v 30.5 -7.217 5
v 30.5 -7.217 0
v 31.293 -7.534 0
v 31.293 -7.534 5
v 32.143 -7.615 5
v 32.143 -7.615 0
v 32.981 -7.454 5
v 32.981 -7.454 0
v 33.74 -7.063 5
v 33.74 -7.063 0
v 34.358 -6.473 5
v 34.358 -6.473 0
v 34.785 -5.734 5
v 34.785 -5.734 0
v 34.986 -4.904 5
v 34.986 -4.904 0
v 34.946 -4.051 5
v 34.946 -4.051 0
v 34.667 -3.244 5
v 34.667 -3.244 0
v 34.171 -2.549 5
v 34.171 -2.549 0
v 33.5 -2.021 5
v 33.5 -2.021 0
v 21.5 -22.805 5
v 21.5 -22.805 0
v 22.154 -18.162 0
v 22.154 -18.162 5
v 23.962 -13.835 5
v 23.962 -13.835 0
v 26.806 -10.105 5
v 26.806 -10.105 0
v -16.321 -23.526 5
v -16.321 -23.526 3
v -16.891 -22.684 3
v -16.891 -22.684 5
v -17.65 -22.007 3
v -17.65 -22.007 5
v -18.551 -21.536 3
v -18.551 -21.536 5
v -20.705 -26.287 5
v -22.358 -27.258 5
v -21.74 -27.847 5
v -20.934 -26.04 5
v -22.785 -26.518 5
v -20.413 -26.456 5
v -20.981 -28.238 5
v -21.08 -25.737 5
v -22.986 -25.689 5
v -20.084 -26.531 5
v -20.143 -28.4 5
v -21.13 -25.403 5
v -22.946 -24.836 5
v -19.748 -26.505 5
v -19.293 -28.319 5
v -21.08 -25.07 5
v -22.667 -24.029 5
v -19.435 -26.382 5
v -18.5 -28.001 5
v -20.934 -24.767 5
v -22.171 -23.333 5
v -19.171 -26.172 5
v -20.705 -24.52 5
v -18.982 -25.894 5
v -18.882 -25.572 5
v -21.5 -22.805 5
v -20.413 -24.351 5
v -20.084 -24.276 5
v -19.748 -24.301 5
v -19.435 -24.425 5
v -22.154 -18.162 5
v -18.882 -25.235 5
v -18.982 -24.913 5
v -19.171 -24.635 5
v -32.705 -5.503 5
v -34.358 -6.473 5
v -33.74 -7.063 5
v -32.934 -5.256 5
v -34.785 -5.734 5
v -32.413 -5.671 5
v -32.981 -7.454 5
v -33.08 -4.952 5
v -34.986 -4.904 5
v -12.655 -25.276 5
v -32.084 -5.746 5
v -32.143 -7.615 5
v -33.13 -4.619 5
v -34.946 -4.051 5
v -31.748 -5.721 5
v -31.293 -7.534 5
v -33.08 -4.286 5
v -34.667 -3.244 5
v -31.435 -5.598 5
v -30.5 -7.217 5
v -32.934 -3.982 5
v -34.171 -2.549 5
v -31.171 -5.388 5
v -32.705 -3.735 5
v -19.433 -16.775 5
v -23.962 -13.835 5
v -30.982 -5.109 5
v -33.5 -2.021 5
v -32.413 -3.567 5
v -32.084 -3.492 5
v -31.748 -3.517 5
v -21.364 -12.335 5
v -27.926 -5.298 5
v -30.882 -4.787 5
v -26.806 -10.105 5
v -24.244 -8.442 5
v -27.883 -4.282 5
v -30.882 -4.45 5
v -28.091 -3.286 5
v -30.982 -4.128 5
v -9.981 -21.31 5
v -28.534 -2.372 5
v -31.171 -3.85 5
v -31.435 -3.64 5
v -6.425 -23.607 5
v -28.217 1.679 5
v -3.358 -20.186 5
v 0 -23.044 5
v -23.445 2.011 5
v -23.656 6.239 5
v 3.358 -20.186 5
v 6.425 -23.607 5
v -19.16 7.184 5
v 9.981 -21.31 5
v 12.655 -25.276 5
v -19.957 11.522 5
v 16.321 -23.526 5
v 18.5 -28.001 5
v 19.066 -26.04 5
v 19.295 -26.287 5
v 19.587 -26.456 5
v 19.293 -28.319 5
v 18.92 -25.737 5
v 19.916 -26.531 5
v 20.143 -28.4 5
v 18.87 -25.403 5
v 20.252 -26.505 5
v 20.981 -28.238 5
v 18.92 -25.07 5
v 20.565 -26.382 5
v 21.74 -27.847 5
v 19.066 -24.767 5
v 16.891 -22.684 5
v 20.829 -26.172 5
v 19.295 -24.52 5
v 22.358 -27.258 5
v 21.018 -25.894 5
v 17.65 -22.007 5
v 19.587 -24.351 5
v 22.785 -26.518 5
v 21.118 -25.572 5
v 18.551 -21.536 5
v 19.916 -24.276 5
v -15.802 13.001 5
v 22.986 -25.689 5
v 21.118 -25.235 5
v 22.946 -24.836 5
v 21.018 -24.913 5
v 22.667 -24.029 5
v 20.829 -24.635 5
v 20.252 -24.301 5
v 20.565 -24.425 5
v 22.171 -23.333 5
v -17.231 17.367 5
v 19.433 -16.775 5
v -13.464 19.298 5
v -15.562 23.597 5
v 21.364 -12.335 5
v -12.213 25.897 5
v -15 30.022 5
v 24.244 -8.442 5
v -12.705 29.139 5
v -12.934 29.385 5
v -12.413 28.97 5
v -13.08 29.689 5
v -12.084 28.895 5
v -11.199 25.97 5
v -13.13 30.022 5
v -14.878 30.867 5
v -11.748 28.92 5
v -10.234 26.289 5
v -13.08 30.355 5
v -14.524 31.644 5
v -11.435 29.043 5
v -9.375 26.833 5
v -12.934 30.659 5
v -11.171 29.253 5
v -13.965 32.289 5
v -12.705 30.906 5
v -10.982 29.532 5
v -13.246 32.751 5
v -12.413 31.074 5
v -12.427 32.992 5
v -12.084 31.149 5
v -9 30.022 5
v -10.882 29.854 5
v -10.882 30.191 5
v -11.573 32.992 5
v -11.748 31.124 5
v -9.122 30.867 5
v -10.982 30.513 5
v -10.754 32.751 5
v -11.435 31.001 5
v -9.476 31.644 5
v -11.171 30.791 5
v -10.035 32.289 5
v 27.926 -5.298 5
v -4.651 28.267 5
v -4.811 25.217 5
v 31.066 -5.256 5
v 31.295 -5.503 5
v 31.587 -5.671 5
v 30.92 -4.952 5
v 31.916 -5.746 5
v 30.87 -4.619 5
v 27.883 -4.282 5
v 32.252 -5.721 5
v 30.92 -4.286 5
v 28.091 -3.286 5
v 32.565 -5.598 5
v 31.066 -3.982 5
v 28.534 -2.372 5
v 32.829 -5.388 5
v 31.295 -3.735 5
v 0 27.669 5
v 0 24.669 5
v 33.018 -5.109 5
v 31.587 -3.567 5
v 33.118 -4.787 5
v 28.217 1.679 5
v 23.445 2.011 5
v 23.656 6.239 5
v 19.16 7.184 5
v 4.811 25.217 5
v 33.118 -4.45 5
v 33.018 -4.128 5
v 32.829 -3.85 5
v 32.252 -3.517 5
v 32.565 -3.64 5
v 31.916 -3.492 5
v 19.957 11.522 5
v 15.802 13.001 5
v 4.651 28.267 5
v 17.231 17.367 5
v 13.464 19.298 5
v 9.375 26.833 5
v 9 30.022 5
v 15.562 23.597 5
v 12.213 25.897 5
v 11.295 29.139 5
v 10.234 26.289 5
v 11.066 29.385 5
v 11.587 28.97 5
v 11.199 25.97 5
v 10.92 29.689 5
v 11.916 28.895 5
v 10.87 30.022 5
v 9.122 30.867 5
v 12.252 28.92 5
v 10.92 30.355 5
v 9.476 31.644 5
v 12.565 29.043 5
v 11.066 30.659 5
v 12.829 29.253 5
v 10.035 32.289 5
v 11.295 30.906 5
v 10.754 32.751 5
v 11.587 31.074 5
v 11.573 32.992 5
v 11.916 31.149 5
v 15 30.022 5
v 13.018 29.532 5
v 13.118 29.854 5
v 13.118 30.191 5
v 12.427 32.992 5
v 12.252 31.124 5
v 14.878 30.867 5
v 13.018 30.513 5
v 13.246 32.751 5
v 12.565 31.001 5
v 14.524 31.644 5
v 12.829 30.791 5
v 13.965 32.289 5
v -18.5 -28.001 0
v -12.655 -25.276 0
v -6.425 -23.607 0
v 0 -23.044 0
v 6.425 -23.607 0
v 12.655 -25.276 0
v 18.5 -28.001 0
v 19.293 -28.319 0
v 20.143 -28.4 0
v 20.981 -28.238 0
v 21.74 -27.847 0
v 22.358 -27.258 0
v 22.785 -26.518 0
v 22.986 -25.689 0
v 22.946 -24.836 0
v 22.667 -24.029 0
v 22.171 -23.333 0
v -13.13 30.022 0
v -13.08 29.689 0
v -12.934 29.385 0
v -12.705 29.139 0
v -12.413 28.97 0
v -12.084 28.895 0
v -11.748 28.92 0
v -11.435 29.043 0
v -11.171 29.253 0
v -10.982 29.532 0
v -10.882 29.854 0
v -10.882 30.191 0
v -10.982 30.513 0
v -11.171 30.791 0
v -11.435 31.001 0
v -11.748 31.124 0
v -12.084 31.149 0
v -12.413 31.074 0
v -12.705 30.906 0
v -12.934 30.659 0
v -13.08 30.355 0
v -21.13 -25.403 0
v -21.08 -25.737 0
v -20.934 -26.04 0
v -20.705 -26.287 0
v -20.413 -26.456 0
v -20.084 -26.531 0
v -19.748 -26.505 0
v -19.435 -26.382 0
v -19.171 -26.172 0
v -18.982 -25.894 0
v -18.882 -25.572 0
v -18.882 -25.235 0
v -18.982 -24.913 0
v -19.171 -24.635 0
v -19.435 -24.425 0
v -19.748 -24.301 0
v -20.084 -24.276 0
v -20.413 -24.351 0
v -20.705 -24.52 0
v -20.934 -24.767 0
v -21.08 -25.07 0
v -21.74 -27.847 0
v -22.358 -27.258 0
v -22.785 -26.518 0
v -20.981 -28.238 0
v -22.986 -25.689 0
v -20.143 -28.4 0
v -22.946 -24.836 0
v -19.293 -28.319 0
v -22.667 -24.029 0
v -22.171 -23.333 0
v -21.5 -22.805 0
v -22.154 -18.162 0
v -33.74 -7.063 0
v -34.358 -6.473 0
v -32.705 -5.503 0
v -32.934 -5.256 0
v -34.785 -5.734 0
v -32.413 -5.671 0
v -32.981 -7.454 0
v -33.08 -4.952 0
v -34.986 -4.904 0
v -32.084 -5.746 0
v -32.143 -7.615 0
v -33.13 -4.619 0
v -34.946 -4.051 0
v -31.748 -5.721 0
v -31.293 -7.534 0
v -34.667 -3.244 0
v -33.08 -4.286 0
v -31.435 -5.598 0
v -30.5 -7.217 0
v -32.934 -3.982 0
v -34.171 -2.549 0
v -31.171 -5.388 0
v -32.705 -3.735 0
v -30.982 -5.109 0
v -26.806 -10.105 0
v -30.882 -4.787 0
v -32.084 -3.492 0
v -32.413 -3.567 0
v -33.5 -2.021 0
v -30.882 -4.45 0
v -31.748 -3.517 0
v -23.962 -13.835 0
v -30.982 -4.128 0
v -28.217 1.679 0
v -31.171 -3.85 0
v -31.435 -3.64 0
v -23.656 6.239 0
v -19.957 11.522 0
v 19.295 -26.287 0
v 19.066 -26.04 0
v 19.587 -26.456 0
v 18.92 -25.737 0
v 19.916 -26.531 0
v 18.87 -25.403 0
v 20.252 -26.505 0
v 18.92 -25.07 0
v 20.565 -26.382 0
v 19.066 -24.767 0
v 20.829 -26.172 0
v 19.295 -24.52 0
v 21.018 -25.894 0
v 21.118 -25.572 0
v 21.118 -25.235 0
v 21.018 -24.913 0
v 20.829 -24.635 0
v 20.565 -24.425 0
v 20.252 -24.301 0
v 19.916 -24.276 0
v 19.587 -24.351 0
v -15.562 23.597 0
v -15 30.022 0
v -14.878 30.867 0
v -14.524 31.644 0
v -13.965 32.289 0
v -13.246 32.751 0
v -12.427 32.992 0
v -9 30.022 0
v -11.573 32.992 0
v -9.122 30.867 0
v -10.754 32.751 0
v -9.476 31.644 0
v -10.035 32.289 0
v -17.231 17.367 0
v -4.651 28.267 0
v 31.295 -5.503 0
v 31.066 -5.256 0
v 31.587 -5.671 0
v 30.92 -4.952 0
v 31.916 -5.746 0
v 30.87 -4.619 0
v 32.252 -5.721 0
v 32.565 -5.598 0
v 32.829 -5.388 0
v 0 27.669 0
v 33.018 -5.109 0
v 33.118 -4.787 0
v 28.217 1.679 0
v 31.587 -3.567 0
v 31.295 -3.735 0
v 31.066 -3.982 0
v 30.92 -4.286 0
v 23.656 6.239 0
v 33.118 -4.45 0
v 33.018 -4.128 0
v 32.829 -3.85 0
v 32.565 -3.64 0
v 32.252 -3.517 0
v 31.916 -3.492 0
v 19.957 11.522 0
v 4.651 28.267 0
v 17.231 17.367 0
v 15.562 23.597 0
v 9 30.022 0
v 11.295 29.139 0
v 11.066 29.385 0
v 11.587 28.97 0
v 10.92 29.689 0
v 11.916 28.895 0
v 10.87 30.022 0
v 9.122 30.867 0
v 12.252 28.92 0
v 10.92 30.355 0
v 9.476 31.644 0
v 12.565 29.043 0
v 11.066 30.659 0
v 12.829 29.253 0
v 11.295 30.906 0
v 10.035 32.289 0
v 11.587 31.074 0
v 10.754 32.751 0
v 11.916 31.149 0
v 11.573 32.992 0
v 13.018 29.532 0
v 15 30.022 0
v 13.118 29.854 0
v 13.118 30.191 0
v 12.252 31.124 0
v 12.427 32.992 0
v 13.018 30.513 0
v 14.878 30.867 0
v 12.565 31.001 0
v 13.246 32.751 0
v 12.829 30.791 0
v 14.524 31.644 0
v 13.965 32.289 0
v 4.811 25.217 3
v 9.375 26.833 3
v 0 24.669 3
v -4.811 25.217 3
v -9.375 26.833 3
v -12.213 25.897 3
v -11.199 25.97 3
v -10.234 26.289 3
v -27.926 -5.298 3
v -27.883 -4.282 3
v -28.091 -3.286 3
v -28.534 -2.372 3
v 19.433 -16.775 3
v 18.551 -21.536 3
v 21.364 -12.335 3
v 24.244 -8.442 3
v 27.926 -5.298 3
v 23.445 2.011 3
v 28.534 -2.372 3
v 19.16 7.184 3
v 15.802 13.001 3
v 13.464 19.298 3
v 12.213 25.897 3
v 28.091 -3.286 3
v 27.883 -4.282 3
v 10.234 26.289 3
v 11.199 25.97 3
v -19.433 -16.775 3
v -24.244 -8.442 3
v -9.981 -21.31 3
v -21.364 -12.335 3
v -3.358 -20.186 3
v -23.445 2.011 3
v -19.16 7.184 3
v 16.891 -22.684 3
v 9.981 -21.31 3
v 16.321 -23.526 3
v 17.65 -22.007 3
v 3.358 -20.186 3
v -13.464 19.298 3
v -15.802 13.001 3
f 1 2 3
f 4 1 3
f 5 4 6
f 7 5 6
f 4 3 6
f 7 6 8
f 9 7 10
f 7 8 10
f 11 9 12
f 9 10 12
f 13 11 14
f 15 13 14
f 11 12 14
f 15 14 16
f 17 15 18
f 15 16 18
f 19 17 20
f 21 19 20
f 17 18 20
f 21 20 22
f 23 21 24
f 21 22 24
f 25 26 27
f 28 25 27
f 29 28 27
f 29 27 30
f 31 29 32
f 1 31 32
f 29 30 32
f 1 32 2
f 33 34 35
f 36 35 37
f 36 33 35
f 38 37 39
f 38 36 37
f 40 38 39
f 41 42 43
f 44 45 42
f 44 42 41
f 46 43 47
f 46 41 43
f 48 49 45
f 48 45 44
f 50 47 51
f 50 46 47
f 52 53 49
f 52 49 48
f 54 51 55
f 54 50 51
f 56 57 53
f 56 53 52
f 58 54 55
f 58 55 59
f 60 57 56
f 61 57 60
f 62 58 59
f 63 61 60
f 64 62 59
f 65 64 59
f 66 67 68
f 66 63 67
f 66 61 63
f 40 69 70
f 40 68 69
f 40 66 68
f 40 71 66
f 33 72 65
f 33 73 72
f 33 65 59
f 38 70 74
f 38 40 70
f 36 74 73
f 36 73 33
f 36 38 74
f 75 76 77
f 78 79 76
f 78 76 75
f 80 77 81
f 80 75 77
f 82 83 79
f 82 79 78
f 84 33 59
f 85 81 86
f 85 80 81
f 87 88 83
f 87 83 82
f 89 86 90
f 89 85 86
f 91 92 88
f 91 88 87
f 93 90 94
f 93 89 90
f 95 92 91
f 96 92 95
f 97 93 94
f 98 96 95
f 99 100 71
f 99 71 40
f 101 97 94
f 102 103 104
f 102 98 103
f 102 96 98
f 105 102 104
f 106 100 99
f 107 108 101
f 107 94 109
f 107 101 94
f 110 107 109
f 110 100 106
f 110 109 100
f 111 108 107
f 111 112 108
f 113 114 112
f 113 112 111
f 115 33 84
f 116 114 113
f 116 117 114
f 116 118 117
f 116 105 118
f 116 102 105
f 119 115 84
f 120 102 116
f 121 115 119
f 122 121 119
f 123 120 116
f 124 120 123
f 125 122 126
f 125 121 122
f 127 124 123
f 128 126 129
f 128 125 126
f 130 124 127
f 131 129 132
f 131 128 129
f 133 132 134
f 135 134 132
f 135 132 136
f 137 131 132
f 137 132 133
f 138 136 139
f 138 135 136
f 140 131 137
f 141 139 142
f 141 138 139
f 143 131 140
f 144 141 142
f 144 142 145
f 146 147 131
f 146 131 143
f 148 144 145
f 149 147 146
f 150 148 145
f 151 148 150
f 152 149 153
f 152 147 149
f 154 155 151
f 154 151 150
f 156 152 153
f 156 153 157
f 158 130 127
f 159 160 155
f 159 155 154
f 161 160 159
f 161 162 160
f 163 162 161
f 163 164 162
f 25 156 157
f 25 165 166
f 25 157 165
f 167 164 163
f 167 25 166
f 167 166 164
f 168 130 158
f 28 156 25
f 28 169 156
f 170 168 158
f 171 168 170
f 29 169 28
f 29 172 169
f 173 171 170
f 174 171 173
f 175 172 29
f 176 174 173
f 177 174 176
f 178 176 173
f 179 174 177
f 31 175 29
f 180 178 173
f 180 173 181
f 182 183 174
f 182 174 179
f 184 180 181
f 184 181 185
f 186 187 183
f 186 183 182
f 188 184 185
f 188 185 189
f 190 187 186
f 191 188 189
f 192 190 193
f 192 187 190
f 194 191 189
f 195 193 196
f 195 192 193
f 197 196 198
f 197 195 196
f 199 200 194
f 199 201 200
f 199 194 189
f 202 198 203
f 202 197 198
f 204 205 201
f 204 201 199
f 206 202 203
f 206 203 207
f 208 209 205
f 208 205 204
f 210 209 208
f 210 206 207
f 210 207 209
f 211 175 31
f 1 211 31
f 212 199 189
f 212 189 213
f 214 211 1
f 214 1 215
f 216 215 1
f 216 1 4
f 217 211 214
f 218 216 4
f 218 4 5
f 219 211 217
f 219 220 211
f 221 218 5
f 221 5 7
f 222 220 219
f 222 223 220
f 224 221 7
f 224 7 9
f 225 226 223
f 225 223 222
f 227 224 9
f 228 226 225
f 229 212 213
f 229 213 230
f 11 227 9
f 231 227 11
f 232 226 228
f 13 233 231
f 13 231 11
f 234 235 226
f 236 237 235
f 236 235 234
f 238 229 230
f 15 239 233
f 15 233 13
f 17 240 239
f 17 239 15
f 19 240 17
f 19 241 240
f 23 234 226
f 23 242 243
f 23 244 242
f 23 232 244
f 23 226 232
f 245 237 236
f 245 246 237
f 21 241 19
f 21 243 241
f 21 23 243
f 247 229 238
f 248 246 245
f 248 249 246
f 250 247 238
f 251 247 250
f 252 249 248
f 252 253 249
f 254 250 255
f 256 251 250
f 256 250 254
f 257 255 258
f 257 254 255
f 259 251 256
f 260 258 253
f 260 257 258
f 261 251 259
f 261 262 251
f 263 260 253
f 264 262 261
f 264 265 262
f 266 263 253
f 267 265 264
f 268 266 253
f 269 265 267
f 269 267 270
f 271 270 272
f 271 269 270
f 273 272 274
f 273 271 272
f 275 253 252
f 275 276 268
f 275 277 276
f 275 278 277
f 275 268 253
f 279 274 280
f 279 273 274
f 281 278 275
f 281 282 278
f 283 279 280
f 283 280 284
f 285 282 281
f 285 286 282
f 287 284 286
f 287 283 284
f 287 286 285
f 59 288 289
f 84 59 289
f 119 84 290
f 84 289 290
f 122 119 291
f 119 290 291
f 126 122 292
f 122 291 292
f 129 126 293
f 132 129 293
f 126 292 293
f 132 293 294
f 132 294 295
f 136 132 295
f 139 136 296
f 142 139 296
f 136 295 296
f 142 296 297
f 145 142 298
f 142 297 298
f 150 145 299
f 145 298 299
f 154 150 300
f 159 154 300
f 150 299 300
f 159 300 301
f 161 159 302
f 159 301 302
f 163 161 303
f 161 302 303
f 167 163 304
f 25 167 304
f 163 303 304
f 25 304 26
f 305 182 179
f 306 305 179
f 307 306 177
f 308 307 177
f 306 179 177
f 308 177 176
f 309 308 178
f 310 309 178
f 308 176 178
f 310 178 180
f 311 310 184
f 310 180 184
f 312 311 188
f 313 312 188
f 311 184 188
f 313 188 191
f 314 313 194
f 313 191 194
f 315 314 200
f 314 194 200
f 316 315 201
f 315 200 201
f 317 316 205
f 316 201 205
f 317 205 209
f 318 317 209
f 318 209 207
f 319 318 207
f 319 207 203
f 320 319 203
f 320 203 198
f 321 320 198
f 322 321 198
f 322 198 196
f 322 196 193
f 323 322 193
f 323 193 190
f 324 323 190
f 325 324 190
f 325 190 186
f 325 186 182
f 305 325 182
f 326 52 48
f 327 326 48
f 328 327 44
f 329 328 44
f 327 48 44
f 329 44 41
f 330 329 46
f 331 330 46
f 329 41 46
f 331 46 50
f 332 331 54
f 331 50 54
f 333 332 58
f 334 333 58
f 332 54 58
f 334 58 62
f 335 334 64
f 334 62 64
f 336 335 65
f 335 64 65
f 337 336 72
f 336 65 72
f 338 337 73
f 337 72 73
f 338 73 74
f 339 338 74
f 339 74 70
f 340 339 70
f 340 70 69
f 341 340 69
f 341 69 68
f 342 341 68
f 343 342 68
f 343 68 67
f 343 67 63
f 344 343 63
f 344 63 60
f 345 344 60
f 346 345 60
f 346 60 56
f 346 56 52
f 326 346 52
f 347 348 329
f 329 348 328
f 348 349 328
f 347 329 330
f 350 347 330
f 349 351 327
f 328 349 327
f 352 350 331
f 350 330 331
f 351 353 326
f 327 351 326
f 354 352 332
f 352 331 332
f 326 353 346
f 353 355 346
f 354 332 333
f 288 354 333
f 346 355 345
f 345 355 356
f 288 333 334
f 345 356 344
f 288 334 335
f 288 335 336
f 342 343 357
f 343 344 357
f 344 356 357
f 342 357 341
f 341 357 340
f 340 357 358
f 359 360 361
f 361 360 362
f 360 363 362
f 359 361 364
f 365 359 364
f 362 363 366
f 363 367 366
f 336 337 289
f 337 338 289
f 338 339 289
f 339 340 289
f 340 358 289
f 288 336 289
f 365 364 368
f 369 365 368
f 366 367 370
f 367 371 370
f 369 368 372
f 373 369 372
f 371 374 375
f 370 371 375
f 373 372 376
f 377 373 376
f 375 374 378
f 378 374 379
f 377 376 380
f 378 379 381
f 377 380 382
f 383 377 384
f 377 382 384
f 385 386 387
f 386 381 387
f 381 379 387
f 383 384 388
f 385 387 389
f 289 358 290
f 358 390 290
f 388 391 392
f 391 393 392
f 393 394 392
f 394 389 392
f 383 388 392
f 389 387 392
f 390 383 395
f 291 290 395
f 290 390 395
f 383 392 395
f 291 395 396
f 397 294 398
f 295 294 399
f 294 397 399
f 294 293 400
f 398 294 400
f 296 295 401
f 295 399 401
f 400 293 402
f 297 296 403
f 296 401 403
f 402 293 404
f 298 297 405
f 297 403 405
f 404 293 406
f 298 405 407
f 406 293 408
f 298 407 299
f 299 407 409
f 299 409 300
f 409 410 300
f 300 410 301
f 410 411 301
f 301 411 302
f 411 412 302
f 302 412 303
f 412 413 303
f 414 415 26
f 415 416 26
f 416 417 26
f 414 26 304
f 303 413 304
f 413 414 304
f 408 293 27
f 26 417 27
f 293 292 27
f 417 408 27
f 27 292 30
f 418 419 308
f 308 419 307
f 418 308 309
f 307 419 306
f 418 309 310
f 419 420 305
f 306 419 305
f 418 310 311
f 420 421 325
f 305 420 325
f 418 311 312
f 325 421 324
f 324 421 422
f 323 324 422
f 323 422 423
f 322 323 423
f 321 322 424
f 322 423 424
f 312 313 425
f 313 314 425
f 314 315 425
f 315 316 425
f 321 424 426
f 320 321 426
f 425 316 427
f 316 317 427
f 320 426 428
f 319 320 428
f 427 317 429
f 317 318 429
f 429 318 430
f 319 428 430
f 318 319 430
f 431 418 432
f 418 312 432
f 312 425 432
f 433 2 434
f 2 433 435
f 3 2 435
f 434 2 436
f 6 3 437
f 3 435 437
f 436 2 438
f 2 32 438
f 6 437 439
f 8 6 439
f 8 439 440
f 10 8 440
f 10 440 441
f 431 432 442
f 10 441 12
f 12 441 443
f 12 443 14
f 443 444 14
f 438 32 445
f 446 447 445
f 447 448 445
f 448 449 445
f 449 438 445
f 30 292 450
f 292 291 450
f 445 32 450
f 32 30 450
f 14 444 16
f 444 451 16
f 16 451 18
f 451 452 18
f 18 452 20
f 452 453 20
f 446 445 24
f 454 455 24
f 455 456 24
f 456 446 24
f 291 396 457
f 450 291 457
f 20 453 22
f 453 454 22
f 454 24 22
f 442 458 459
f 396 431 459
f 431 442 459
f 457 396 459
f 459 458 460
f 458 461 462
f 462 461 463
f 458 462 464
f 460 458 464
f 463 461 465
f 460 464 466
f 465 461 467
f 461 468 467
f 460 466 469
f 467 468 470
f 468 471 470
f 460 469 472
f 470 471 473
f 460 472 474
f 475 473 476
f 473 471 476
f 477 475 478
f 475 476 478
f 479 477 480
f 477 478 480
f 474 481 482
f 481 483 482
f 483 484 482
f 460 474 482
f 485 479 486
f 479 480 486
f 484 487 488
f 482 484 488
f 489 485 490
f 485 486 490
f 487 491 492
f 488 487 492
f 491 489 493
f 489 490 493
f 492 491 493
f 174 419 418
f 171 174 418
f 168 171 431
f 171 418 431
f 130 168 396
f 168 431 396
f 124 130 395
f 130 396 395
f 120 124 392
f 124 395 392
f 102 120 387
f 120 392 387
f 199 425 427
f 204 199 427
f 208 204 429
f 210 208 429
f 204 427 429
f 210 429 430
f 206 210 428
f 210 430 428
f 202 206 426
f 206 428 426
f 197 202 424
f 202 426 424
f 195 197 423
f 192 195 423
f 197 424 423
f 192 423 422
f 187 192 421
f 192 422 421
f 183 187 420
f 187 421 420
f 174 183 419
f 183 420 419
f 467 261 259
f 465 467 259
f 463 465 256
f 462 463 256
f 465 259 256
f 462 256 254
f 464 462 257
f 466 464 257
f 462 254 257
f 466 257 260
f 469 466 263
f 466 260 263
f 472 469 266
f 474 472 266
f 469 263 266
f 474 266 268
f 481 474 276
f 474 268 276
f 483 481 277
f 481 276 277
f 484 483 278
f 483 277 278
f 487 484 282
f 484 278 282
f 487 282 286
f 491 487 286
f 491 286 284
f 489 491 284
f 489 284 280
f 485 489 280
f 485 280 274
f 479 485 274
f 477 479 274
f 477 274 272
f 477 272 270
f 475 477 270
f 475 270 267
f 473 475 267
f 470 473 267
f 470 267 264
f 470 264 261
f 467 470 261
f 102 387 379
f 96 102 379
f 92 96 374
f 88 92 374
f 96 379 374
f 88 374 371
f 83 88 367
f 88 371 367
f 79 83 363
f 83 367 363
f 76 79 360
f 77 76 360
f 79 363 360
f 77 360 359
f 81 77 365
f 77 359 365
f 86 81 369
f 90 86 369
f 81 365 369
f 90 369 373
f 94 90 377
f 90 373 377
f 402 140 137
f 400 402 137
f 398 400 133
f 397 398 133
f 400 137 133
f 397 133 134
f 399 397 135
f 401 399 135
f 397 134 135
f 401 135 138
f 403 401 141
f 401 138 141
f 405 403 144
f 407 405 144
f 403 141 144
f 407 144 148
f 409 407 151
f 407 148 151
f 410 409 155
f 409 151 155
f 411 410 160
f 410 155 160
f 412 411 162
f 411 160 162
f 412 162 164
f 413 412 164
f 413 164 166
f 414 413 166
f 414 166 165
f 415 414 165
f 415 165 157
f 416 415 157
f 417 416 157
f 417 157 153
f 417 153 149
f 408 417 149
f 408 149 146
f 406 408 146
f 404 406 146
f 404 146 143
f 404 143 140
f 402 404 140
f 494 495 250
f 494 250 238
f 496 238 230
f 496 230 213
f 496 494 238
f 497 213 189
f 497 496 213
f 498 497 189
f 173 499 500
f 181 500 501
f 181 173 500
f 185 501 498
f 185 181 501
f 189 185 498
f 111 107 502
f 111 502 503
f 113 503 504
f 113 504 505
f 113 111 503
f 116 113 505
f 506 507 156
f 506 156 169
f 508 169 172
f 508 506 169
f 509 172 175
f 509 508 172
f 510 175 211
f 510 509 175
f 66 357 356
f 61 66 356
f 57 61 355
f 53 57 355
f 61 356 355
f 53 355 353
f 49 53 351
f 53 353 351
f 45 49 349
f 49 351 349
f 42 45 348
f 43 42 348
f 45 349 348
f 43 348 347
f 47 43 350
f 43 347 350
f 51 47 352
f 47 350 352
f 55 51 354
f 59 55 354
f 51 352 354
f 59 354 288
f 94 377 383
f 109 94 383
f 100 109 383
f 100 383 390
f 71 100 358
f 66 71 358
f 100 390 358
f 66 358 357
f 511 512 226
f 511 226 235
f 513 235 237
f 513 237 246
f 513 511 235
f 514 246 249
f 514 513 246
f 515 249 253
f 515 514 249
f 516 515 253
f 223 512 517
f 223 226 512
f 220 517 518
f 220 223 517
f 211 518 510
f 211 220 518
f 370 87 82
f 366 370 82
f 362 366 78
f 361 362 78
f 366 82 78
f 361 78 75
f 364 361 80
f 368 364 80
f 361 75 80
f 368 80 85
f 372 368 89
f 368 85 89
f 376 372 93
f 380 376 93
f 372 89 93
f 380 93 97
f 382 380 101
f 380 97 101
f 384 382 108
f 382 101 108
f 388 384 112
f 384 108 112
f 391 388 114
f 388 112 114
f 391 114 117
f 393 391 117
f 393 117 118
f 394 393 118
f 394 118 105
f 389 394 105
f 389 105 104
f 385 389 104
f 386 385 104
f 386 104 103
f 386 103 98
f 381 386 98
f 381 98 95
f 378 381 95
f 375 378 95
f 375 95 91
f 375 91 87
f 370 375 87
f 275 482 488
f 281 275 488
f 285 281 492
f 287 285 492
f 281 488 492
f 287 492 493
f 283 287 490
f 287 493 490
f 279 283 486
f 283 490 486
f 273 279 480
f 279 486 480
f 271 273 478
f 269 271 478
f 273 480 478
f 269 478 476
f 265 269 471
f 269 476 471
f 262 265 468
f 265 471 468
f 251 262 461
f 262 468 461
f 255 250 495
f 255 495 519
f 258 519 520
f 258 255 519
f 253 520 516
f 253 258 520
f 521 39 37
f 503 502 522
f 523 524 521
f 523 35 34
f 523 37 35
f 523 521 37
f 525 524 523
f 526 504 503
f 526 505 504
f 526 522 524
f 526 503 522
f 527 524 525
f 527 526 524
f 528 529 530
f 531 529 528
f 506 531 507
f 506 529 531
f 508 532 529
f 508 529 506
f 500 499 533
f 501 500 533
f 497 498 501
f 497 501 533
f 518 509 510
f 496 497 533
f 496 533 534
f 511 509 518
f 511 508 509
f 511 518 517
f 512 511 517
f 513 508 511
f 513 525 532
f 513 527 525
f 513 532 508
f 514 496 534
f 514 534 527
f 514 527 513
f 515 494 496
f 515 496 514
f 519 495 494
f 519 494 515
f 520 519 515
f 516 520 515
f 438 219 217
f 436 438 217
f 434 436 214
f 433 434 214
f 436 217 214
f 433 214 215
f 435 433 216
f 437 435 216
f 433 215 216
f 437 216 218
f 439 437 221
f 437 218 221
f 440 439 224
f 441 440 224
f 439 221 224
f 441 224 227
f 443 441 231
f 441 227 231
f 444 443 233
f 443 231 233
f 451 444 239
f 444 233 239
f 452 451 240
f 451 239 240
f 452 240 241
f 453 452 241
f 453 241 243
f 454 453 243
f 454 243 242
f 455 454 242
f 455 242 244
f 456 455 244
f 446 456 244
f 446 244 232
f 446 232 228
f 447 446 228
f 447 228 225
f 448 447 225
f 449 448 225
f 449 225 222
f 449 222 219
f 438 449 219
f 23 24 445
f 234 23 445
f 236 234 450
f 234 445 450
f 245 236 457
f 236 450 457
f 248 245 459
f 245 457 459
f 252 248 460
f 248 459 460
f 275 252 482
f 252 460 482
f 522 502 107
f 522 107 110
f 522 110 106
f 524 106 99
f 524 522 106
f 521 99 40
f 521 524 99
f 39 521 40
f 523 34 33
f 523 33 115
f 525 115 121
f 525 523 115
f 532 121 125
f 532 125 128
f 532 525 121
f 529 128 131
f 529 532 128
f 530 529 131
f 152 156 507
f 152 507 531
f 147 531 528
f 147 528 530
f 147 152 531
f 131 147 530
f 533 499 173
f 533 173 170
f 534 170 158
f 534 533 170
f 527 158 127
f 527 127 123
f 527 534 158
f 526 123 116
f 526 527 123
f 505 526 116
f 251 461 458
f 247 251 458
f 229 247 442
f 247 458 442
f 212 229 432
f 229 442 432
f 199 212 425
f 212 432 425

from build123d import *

# Parameters (mm, degrees)
F2_DEPTH    = 5
F3_D        = 2.2606
F4_T        = 3
F4_T3_DEPTH = 11


# Not quite as in the source:
# - a shell that OpenCascade refuses in one call is made with other operations: the cavity is built on its own and cut out


with BuildPart() as f2:
    # F1 (on Top) → F2 (new body)
    with BuildSketch(Plane.XY):
        with BuildLine():
            ThreePointArc((9, 30.0222139979), (0, 27.6692232402), (-9, 30.0222139979))
            ThreePointArc((-9, 30.0222139979), (-12, 33.0222139979), (-15, 30.0222139979))
            ThreePointArc((-15, 30.0222139979), (-19.95706006, 11.5222139979), (-33.5, -2.0207259422))
            ThreePointArc((-33.5, -2.0207259422), (-34.5980762114, -6.1188021535), (-30.5, -7.2168783649))
            ThreePointArc((-30.5, -7.2168783649), (-23.962250229, -13.8346116201), (-21.5, -22.805335633))
            ThreePointArc((-21.5, -22.805335633), (-22.5980762114, -26.9034118443), (-18.5, -28.0014880557))
            ThreePointArc((-18.5, -28.0014880557), (0, -23.0444279957), (18.5, -28.0014880557))
            ThreePointArc((18.5, -28.0014880557), (22.5980762114, -26.9034118443), (21.5, -22.805335633))
            ThreePointArc((21.5, -22.805335633), (23.962250229, -13.8346116201), (30.5, -7.2168783649))
            ThreePointArc((30.5, -7.2168783649), (34.5980762114, -6.1188021535), (33.5, -2.0207259422))
            ThreePointArc((33.5, -2.0207259422), (19.95706006, 11.5222139979), (15, 30.0222139979))
            ThreePointArc((15, 30.0222139979), (12, 33.0222139979), (9, 30.0222139979))
        make_face()
    extrude(amount=F2_DEPTH)

    # F3 (through all)
    with Locations(Plane(origin=(0, 0, 0), x_dir=(1, 0, 0), z_dir=(0, 0, -1))):
        with Locations((-12, -30.0222139979), (12, -30.0222139979), (32, 4.6188021535), (20, 25.4034118443), (-20, 25.4034118443), (-32, 4.6188021535)):
            Hole(F3_D / 2)

    # F4: shell of thickness 3, made by hand


with BuildPart() as f4_core1:
    # F4_t2: copy of F2
    add(f2.part)

    # the walls: a layer under each face that stays
    f4_faces = [f4_core1.faces().sort_by_distance(p)[0] for p in [
        (0, -23.0444279957, 2.5),
        (0, 2.3094010768, 0),
        (-23.962250229, -13.8346116201, 2.5),
        (23.962250229, -13.8346116201, 2.5),
        (-19.95706006, 11.5222139979, 2.5),
        (19.95706006, 11.5222139979, 2.5),
        (0, 27.6692232402, 2.5),
        (-21.1303, -25.4034118443, 2.5),
        (-33.1303, -4.6188021535, 2.5),
        (18.8697, -25.4034118443, 2.5),
        (30.8697, -4.6188021535, 2.5),
        (-13.1303, 30.0222139979, 2.5),
        (10.8697, 30.0222139979, 2.5),
    ]]
    thicken(f4_faces, amount=-F4_T, mode=Mode.SUBTRACT)

    # F4_s4 → F4_t3 (cut)
    with BuildSketch(Plane.XY.offset(-3)):
        Polygon((-21.5449977822, -22.7797196489), (-20, -25.4034118443), (-18.4788645602, -24.5251838887), (-18.5002217799, -22.7688578263), align=None)
        Polygon((21.5449977822, -22.7797196489), (20, -25.4034118443), (18.4788645602, -24.5251838887), (18.5002217799, -22.7688578263), align=None)
        Polygon((-30.5003147982, -7.2686555794), (-28.9685201827, -4.6372331239), (-30.4788645602, -3.7405741979), (-32, -4.6188021535), align=None)
        Polygon((30.5003147982, -7.2686555794), (28.9685201827, -4.6372331239), (30.4788645602, -3.7405741979), (32, -4.6188021535), align=None)
        Polygon((-8.955317016, 30.0483752283), (-12, 30.0222139979), (-12, 28.2657580866), (-10.4682984028, 27.4060909502), align=None)
        Polygon((8.955317016, 30.0483752283), (12, 30.0222139979), (12, 28.2657580866), (10.4682984028, 27.4060909502), align=None)
    extrude(amount=F4_T3_DEPTH, mode=Mode.SUBTRACT)


with BuildPart() as f2_1:
    add(f2.part)

    # what is left inside the walls is the cavity
    f4_cavity = [f4_core1.part.solids().sort_by_distance(p)[0] for p in [
        (0, -6.739348, 4.97),
    ]]
    add(f4_cavity, mode=Mode.SUBTRACT)


solid = f2_1.part
